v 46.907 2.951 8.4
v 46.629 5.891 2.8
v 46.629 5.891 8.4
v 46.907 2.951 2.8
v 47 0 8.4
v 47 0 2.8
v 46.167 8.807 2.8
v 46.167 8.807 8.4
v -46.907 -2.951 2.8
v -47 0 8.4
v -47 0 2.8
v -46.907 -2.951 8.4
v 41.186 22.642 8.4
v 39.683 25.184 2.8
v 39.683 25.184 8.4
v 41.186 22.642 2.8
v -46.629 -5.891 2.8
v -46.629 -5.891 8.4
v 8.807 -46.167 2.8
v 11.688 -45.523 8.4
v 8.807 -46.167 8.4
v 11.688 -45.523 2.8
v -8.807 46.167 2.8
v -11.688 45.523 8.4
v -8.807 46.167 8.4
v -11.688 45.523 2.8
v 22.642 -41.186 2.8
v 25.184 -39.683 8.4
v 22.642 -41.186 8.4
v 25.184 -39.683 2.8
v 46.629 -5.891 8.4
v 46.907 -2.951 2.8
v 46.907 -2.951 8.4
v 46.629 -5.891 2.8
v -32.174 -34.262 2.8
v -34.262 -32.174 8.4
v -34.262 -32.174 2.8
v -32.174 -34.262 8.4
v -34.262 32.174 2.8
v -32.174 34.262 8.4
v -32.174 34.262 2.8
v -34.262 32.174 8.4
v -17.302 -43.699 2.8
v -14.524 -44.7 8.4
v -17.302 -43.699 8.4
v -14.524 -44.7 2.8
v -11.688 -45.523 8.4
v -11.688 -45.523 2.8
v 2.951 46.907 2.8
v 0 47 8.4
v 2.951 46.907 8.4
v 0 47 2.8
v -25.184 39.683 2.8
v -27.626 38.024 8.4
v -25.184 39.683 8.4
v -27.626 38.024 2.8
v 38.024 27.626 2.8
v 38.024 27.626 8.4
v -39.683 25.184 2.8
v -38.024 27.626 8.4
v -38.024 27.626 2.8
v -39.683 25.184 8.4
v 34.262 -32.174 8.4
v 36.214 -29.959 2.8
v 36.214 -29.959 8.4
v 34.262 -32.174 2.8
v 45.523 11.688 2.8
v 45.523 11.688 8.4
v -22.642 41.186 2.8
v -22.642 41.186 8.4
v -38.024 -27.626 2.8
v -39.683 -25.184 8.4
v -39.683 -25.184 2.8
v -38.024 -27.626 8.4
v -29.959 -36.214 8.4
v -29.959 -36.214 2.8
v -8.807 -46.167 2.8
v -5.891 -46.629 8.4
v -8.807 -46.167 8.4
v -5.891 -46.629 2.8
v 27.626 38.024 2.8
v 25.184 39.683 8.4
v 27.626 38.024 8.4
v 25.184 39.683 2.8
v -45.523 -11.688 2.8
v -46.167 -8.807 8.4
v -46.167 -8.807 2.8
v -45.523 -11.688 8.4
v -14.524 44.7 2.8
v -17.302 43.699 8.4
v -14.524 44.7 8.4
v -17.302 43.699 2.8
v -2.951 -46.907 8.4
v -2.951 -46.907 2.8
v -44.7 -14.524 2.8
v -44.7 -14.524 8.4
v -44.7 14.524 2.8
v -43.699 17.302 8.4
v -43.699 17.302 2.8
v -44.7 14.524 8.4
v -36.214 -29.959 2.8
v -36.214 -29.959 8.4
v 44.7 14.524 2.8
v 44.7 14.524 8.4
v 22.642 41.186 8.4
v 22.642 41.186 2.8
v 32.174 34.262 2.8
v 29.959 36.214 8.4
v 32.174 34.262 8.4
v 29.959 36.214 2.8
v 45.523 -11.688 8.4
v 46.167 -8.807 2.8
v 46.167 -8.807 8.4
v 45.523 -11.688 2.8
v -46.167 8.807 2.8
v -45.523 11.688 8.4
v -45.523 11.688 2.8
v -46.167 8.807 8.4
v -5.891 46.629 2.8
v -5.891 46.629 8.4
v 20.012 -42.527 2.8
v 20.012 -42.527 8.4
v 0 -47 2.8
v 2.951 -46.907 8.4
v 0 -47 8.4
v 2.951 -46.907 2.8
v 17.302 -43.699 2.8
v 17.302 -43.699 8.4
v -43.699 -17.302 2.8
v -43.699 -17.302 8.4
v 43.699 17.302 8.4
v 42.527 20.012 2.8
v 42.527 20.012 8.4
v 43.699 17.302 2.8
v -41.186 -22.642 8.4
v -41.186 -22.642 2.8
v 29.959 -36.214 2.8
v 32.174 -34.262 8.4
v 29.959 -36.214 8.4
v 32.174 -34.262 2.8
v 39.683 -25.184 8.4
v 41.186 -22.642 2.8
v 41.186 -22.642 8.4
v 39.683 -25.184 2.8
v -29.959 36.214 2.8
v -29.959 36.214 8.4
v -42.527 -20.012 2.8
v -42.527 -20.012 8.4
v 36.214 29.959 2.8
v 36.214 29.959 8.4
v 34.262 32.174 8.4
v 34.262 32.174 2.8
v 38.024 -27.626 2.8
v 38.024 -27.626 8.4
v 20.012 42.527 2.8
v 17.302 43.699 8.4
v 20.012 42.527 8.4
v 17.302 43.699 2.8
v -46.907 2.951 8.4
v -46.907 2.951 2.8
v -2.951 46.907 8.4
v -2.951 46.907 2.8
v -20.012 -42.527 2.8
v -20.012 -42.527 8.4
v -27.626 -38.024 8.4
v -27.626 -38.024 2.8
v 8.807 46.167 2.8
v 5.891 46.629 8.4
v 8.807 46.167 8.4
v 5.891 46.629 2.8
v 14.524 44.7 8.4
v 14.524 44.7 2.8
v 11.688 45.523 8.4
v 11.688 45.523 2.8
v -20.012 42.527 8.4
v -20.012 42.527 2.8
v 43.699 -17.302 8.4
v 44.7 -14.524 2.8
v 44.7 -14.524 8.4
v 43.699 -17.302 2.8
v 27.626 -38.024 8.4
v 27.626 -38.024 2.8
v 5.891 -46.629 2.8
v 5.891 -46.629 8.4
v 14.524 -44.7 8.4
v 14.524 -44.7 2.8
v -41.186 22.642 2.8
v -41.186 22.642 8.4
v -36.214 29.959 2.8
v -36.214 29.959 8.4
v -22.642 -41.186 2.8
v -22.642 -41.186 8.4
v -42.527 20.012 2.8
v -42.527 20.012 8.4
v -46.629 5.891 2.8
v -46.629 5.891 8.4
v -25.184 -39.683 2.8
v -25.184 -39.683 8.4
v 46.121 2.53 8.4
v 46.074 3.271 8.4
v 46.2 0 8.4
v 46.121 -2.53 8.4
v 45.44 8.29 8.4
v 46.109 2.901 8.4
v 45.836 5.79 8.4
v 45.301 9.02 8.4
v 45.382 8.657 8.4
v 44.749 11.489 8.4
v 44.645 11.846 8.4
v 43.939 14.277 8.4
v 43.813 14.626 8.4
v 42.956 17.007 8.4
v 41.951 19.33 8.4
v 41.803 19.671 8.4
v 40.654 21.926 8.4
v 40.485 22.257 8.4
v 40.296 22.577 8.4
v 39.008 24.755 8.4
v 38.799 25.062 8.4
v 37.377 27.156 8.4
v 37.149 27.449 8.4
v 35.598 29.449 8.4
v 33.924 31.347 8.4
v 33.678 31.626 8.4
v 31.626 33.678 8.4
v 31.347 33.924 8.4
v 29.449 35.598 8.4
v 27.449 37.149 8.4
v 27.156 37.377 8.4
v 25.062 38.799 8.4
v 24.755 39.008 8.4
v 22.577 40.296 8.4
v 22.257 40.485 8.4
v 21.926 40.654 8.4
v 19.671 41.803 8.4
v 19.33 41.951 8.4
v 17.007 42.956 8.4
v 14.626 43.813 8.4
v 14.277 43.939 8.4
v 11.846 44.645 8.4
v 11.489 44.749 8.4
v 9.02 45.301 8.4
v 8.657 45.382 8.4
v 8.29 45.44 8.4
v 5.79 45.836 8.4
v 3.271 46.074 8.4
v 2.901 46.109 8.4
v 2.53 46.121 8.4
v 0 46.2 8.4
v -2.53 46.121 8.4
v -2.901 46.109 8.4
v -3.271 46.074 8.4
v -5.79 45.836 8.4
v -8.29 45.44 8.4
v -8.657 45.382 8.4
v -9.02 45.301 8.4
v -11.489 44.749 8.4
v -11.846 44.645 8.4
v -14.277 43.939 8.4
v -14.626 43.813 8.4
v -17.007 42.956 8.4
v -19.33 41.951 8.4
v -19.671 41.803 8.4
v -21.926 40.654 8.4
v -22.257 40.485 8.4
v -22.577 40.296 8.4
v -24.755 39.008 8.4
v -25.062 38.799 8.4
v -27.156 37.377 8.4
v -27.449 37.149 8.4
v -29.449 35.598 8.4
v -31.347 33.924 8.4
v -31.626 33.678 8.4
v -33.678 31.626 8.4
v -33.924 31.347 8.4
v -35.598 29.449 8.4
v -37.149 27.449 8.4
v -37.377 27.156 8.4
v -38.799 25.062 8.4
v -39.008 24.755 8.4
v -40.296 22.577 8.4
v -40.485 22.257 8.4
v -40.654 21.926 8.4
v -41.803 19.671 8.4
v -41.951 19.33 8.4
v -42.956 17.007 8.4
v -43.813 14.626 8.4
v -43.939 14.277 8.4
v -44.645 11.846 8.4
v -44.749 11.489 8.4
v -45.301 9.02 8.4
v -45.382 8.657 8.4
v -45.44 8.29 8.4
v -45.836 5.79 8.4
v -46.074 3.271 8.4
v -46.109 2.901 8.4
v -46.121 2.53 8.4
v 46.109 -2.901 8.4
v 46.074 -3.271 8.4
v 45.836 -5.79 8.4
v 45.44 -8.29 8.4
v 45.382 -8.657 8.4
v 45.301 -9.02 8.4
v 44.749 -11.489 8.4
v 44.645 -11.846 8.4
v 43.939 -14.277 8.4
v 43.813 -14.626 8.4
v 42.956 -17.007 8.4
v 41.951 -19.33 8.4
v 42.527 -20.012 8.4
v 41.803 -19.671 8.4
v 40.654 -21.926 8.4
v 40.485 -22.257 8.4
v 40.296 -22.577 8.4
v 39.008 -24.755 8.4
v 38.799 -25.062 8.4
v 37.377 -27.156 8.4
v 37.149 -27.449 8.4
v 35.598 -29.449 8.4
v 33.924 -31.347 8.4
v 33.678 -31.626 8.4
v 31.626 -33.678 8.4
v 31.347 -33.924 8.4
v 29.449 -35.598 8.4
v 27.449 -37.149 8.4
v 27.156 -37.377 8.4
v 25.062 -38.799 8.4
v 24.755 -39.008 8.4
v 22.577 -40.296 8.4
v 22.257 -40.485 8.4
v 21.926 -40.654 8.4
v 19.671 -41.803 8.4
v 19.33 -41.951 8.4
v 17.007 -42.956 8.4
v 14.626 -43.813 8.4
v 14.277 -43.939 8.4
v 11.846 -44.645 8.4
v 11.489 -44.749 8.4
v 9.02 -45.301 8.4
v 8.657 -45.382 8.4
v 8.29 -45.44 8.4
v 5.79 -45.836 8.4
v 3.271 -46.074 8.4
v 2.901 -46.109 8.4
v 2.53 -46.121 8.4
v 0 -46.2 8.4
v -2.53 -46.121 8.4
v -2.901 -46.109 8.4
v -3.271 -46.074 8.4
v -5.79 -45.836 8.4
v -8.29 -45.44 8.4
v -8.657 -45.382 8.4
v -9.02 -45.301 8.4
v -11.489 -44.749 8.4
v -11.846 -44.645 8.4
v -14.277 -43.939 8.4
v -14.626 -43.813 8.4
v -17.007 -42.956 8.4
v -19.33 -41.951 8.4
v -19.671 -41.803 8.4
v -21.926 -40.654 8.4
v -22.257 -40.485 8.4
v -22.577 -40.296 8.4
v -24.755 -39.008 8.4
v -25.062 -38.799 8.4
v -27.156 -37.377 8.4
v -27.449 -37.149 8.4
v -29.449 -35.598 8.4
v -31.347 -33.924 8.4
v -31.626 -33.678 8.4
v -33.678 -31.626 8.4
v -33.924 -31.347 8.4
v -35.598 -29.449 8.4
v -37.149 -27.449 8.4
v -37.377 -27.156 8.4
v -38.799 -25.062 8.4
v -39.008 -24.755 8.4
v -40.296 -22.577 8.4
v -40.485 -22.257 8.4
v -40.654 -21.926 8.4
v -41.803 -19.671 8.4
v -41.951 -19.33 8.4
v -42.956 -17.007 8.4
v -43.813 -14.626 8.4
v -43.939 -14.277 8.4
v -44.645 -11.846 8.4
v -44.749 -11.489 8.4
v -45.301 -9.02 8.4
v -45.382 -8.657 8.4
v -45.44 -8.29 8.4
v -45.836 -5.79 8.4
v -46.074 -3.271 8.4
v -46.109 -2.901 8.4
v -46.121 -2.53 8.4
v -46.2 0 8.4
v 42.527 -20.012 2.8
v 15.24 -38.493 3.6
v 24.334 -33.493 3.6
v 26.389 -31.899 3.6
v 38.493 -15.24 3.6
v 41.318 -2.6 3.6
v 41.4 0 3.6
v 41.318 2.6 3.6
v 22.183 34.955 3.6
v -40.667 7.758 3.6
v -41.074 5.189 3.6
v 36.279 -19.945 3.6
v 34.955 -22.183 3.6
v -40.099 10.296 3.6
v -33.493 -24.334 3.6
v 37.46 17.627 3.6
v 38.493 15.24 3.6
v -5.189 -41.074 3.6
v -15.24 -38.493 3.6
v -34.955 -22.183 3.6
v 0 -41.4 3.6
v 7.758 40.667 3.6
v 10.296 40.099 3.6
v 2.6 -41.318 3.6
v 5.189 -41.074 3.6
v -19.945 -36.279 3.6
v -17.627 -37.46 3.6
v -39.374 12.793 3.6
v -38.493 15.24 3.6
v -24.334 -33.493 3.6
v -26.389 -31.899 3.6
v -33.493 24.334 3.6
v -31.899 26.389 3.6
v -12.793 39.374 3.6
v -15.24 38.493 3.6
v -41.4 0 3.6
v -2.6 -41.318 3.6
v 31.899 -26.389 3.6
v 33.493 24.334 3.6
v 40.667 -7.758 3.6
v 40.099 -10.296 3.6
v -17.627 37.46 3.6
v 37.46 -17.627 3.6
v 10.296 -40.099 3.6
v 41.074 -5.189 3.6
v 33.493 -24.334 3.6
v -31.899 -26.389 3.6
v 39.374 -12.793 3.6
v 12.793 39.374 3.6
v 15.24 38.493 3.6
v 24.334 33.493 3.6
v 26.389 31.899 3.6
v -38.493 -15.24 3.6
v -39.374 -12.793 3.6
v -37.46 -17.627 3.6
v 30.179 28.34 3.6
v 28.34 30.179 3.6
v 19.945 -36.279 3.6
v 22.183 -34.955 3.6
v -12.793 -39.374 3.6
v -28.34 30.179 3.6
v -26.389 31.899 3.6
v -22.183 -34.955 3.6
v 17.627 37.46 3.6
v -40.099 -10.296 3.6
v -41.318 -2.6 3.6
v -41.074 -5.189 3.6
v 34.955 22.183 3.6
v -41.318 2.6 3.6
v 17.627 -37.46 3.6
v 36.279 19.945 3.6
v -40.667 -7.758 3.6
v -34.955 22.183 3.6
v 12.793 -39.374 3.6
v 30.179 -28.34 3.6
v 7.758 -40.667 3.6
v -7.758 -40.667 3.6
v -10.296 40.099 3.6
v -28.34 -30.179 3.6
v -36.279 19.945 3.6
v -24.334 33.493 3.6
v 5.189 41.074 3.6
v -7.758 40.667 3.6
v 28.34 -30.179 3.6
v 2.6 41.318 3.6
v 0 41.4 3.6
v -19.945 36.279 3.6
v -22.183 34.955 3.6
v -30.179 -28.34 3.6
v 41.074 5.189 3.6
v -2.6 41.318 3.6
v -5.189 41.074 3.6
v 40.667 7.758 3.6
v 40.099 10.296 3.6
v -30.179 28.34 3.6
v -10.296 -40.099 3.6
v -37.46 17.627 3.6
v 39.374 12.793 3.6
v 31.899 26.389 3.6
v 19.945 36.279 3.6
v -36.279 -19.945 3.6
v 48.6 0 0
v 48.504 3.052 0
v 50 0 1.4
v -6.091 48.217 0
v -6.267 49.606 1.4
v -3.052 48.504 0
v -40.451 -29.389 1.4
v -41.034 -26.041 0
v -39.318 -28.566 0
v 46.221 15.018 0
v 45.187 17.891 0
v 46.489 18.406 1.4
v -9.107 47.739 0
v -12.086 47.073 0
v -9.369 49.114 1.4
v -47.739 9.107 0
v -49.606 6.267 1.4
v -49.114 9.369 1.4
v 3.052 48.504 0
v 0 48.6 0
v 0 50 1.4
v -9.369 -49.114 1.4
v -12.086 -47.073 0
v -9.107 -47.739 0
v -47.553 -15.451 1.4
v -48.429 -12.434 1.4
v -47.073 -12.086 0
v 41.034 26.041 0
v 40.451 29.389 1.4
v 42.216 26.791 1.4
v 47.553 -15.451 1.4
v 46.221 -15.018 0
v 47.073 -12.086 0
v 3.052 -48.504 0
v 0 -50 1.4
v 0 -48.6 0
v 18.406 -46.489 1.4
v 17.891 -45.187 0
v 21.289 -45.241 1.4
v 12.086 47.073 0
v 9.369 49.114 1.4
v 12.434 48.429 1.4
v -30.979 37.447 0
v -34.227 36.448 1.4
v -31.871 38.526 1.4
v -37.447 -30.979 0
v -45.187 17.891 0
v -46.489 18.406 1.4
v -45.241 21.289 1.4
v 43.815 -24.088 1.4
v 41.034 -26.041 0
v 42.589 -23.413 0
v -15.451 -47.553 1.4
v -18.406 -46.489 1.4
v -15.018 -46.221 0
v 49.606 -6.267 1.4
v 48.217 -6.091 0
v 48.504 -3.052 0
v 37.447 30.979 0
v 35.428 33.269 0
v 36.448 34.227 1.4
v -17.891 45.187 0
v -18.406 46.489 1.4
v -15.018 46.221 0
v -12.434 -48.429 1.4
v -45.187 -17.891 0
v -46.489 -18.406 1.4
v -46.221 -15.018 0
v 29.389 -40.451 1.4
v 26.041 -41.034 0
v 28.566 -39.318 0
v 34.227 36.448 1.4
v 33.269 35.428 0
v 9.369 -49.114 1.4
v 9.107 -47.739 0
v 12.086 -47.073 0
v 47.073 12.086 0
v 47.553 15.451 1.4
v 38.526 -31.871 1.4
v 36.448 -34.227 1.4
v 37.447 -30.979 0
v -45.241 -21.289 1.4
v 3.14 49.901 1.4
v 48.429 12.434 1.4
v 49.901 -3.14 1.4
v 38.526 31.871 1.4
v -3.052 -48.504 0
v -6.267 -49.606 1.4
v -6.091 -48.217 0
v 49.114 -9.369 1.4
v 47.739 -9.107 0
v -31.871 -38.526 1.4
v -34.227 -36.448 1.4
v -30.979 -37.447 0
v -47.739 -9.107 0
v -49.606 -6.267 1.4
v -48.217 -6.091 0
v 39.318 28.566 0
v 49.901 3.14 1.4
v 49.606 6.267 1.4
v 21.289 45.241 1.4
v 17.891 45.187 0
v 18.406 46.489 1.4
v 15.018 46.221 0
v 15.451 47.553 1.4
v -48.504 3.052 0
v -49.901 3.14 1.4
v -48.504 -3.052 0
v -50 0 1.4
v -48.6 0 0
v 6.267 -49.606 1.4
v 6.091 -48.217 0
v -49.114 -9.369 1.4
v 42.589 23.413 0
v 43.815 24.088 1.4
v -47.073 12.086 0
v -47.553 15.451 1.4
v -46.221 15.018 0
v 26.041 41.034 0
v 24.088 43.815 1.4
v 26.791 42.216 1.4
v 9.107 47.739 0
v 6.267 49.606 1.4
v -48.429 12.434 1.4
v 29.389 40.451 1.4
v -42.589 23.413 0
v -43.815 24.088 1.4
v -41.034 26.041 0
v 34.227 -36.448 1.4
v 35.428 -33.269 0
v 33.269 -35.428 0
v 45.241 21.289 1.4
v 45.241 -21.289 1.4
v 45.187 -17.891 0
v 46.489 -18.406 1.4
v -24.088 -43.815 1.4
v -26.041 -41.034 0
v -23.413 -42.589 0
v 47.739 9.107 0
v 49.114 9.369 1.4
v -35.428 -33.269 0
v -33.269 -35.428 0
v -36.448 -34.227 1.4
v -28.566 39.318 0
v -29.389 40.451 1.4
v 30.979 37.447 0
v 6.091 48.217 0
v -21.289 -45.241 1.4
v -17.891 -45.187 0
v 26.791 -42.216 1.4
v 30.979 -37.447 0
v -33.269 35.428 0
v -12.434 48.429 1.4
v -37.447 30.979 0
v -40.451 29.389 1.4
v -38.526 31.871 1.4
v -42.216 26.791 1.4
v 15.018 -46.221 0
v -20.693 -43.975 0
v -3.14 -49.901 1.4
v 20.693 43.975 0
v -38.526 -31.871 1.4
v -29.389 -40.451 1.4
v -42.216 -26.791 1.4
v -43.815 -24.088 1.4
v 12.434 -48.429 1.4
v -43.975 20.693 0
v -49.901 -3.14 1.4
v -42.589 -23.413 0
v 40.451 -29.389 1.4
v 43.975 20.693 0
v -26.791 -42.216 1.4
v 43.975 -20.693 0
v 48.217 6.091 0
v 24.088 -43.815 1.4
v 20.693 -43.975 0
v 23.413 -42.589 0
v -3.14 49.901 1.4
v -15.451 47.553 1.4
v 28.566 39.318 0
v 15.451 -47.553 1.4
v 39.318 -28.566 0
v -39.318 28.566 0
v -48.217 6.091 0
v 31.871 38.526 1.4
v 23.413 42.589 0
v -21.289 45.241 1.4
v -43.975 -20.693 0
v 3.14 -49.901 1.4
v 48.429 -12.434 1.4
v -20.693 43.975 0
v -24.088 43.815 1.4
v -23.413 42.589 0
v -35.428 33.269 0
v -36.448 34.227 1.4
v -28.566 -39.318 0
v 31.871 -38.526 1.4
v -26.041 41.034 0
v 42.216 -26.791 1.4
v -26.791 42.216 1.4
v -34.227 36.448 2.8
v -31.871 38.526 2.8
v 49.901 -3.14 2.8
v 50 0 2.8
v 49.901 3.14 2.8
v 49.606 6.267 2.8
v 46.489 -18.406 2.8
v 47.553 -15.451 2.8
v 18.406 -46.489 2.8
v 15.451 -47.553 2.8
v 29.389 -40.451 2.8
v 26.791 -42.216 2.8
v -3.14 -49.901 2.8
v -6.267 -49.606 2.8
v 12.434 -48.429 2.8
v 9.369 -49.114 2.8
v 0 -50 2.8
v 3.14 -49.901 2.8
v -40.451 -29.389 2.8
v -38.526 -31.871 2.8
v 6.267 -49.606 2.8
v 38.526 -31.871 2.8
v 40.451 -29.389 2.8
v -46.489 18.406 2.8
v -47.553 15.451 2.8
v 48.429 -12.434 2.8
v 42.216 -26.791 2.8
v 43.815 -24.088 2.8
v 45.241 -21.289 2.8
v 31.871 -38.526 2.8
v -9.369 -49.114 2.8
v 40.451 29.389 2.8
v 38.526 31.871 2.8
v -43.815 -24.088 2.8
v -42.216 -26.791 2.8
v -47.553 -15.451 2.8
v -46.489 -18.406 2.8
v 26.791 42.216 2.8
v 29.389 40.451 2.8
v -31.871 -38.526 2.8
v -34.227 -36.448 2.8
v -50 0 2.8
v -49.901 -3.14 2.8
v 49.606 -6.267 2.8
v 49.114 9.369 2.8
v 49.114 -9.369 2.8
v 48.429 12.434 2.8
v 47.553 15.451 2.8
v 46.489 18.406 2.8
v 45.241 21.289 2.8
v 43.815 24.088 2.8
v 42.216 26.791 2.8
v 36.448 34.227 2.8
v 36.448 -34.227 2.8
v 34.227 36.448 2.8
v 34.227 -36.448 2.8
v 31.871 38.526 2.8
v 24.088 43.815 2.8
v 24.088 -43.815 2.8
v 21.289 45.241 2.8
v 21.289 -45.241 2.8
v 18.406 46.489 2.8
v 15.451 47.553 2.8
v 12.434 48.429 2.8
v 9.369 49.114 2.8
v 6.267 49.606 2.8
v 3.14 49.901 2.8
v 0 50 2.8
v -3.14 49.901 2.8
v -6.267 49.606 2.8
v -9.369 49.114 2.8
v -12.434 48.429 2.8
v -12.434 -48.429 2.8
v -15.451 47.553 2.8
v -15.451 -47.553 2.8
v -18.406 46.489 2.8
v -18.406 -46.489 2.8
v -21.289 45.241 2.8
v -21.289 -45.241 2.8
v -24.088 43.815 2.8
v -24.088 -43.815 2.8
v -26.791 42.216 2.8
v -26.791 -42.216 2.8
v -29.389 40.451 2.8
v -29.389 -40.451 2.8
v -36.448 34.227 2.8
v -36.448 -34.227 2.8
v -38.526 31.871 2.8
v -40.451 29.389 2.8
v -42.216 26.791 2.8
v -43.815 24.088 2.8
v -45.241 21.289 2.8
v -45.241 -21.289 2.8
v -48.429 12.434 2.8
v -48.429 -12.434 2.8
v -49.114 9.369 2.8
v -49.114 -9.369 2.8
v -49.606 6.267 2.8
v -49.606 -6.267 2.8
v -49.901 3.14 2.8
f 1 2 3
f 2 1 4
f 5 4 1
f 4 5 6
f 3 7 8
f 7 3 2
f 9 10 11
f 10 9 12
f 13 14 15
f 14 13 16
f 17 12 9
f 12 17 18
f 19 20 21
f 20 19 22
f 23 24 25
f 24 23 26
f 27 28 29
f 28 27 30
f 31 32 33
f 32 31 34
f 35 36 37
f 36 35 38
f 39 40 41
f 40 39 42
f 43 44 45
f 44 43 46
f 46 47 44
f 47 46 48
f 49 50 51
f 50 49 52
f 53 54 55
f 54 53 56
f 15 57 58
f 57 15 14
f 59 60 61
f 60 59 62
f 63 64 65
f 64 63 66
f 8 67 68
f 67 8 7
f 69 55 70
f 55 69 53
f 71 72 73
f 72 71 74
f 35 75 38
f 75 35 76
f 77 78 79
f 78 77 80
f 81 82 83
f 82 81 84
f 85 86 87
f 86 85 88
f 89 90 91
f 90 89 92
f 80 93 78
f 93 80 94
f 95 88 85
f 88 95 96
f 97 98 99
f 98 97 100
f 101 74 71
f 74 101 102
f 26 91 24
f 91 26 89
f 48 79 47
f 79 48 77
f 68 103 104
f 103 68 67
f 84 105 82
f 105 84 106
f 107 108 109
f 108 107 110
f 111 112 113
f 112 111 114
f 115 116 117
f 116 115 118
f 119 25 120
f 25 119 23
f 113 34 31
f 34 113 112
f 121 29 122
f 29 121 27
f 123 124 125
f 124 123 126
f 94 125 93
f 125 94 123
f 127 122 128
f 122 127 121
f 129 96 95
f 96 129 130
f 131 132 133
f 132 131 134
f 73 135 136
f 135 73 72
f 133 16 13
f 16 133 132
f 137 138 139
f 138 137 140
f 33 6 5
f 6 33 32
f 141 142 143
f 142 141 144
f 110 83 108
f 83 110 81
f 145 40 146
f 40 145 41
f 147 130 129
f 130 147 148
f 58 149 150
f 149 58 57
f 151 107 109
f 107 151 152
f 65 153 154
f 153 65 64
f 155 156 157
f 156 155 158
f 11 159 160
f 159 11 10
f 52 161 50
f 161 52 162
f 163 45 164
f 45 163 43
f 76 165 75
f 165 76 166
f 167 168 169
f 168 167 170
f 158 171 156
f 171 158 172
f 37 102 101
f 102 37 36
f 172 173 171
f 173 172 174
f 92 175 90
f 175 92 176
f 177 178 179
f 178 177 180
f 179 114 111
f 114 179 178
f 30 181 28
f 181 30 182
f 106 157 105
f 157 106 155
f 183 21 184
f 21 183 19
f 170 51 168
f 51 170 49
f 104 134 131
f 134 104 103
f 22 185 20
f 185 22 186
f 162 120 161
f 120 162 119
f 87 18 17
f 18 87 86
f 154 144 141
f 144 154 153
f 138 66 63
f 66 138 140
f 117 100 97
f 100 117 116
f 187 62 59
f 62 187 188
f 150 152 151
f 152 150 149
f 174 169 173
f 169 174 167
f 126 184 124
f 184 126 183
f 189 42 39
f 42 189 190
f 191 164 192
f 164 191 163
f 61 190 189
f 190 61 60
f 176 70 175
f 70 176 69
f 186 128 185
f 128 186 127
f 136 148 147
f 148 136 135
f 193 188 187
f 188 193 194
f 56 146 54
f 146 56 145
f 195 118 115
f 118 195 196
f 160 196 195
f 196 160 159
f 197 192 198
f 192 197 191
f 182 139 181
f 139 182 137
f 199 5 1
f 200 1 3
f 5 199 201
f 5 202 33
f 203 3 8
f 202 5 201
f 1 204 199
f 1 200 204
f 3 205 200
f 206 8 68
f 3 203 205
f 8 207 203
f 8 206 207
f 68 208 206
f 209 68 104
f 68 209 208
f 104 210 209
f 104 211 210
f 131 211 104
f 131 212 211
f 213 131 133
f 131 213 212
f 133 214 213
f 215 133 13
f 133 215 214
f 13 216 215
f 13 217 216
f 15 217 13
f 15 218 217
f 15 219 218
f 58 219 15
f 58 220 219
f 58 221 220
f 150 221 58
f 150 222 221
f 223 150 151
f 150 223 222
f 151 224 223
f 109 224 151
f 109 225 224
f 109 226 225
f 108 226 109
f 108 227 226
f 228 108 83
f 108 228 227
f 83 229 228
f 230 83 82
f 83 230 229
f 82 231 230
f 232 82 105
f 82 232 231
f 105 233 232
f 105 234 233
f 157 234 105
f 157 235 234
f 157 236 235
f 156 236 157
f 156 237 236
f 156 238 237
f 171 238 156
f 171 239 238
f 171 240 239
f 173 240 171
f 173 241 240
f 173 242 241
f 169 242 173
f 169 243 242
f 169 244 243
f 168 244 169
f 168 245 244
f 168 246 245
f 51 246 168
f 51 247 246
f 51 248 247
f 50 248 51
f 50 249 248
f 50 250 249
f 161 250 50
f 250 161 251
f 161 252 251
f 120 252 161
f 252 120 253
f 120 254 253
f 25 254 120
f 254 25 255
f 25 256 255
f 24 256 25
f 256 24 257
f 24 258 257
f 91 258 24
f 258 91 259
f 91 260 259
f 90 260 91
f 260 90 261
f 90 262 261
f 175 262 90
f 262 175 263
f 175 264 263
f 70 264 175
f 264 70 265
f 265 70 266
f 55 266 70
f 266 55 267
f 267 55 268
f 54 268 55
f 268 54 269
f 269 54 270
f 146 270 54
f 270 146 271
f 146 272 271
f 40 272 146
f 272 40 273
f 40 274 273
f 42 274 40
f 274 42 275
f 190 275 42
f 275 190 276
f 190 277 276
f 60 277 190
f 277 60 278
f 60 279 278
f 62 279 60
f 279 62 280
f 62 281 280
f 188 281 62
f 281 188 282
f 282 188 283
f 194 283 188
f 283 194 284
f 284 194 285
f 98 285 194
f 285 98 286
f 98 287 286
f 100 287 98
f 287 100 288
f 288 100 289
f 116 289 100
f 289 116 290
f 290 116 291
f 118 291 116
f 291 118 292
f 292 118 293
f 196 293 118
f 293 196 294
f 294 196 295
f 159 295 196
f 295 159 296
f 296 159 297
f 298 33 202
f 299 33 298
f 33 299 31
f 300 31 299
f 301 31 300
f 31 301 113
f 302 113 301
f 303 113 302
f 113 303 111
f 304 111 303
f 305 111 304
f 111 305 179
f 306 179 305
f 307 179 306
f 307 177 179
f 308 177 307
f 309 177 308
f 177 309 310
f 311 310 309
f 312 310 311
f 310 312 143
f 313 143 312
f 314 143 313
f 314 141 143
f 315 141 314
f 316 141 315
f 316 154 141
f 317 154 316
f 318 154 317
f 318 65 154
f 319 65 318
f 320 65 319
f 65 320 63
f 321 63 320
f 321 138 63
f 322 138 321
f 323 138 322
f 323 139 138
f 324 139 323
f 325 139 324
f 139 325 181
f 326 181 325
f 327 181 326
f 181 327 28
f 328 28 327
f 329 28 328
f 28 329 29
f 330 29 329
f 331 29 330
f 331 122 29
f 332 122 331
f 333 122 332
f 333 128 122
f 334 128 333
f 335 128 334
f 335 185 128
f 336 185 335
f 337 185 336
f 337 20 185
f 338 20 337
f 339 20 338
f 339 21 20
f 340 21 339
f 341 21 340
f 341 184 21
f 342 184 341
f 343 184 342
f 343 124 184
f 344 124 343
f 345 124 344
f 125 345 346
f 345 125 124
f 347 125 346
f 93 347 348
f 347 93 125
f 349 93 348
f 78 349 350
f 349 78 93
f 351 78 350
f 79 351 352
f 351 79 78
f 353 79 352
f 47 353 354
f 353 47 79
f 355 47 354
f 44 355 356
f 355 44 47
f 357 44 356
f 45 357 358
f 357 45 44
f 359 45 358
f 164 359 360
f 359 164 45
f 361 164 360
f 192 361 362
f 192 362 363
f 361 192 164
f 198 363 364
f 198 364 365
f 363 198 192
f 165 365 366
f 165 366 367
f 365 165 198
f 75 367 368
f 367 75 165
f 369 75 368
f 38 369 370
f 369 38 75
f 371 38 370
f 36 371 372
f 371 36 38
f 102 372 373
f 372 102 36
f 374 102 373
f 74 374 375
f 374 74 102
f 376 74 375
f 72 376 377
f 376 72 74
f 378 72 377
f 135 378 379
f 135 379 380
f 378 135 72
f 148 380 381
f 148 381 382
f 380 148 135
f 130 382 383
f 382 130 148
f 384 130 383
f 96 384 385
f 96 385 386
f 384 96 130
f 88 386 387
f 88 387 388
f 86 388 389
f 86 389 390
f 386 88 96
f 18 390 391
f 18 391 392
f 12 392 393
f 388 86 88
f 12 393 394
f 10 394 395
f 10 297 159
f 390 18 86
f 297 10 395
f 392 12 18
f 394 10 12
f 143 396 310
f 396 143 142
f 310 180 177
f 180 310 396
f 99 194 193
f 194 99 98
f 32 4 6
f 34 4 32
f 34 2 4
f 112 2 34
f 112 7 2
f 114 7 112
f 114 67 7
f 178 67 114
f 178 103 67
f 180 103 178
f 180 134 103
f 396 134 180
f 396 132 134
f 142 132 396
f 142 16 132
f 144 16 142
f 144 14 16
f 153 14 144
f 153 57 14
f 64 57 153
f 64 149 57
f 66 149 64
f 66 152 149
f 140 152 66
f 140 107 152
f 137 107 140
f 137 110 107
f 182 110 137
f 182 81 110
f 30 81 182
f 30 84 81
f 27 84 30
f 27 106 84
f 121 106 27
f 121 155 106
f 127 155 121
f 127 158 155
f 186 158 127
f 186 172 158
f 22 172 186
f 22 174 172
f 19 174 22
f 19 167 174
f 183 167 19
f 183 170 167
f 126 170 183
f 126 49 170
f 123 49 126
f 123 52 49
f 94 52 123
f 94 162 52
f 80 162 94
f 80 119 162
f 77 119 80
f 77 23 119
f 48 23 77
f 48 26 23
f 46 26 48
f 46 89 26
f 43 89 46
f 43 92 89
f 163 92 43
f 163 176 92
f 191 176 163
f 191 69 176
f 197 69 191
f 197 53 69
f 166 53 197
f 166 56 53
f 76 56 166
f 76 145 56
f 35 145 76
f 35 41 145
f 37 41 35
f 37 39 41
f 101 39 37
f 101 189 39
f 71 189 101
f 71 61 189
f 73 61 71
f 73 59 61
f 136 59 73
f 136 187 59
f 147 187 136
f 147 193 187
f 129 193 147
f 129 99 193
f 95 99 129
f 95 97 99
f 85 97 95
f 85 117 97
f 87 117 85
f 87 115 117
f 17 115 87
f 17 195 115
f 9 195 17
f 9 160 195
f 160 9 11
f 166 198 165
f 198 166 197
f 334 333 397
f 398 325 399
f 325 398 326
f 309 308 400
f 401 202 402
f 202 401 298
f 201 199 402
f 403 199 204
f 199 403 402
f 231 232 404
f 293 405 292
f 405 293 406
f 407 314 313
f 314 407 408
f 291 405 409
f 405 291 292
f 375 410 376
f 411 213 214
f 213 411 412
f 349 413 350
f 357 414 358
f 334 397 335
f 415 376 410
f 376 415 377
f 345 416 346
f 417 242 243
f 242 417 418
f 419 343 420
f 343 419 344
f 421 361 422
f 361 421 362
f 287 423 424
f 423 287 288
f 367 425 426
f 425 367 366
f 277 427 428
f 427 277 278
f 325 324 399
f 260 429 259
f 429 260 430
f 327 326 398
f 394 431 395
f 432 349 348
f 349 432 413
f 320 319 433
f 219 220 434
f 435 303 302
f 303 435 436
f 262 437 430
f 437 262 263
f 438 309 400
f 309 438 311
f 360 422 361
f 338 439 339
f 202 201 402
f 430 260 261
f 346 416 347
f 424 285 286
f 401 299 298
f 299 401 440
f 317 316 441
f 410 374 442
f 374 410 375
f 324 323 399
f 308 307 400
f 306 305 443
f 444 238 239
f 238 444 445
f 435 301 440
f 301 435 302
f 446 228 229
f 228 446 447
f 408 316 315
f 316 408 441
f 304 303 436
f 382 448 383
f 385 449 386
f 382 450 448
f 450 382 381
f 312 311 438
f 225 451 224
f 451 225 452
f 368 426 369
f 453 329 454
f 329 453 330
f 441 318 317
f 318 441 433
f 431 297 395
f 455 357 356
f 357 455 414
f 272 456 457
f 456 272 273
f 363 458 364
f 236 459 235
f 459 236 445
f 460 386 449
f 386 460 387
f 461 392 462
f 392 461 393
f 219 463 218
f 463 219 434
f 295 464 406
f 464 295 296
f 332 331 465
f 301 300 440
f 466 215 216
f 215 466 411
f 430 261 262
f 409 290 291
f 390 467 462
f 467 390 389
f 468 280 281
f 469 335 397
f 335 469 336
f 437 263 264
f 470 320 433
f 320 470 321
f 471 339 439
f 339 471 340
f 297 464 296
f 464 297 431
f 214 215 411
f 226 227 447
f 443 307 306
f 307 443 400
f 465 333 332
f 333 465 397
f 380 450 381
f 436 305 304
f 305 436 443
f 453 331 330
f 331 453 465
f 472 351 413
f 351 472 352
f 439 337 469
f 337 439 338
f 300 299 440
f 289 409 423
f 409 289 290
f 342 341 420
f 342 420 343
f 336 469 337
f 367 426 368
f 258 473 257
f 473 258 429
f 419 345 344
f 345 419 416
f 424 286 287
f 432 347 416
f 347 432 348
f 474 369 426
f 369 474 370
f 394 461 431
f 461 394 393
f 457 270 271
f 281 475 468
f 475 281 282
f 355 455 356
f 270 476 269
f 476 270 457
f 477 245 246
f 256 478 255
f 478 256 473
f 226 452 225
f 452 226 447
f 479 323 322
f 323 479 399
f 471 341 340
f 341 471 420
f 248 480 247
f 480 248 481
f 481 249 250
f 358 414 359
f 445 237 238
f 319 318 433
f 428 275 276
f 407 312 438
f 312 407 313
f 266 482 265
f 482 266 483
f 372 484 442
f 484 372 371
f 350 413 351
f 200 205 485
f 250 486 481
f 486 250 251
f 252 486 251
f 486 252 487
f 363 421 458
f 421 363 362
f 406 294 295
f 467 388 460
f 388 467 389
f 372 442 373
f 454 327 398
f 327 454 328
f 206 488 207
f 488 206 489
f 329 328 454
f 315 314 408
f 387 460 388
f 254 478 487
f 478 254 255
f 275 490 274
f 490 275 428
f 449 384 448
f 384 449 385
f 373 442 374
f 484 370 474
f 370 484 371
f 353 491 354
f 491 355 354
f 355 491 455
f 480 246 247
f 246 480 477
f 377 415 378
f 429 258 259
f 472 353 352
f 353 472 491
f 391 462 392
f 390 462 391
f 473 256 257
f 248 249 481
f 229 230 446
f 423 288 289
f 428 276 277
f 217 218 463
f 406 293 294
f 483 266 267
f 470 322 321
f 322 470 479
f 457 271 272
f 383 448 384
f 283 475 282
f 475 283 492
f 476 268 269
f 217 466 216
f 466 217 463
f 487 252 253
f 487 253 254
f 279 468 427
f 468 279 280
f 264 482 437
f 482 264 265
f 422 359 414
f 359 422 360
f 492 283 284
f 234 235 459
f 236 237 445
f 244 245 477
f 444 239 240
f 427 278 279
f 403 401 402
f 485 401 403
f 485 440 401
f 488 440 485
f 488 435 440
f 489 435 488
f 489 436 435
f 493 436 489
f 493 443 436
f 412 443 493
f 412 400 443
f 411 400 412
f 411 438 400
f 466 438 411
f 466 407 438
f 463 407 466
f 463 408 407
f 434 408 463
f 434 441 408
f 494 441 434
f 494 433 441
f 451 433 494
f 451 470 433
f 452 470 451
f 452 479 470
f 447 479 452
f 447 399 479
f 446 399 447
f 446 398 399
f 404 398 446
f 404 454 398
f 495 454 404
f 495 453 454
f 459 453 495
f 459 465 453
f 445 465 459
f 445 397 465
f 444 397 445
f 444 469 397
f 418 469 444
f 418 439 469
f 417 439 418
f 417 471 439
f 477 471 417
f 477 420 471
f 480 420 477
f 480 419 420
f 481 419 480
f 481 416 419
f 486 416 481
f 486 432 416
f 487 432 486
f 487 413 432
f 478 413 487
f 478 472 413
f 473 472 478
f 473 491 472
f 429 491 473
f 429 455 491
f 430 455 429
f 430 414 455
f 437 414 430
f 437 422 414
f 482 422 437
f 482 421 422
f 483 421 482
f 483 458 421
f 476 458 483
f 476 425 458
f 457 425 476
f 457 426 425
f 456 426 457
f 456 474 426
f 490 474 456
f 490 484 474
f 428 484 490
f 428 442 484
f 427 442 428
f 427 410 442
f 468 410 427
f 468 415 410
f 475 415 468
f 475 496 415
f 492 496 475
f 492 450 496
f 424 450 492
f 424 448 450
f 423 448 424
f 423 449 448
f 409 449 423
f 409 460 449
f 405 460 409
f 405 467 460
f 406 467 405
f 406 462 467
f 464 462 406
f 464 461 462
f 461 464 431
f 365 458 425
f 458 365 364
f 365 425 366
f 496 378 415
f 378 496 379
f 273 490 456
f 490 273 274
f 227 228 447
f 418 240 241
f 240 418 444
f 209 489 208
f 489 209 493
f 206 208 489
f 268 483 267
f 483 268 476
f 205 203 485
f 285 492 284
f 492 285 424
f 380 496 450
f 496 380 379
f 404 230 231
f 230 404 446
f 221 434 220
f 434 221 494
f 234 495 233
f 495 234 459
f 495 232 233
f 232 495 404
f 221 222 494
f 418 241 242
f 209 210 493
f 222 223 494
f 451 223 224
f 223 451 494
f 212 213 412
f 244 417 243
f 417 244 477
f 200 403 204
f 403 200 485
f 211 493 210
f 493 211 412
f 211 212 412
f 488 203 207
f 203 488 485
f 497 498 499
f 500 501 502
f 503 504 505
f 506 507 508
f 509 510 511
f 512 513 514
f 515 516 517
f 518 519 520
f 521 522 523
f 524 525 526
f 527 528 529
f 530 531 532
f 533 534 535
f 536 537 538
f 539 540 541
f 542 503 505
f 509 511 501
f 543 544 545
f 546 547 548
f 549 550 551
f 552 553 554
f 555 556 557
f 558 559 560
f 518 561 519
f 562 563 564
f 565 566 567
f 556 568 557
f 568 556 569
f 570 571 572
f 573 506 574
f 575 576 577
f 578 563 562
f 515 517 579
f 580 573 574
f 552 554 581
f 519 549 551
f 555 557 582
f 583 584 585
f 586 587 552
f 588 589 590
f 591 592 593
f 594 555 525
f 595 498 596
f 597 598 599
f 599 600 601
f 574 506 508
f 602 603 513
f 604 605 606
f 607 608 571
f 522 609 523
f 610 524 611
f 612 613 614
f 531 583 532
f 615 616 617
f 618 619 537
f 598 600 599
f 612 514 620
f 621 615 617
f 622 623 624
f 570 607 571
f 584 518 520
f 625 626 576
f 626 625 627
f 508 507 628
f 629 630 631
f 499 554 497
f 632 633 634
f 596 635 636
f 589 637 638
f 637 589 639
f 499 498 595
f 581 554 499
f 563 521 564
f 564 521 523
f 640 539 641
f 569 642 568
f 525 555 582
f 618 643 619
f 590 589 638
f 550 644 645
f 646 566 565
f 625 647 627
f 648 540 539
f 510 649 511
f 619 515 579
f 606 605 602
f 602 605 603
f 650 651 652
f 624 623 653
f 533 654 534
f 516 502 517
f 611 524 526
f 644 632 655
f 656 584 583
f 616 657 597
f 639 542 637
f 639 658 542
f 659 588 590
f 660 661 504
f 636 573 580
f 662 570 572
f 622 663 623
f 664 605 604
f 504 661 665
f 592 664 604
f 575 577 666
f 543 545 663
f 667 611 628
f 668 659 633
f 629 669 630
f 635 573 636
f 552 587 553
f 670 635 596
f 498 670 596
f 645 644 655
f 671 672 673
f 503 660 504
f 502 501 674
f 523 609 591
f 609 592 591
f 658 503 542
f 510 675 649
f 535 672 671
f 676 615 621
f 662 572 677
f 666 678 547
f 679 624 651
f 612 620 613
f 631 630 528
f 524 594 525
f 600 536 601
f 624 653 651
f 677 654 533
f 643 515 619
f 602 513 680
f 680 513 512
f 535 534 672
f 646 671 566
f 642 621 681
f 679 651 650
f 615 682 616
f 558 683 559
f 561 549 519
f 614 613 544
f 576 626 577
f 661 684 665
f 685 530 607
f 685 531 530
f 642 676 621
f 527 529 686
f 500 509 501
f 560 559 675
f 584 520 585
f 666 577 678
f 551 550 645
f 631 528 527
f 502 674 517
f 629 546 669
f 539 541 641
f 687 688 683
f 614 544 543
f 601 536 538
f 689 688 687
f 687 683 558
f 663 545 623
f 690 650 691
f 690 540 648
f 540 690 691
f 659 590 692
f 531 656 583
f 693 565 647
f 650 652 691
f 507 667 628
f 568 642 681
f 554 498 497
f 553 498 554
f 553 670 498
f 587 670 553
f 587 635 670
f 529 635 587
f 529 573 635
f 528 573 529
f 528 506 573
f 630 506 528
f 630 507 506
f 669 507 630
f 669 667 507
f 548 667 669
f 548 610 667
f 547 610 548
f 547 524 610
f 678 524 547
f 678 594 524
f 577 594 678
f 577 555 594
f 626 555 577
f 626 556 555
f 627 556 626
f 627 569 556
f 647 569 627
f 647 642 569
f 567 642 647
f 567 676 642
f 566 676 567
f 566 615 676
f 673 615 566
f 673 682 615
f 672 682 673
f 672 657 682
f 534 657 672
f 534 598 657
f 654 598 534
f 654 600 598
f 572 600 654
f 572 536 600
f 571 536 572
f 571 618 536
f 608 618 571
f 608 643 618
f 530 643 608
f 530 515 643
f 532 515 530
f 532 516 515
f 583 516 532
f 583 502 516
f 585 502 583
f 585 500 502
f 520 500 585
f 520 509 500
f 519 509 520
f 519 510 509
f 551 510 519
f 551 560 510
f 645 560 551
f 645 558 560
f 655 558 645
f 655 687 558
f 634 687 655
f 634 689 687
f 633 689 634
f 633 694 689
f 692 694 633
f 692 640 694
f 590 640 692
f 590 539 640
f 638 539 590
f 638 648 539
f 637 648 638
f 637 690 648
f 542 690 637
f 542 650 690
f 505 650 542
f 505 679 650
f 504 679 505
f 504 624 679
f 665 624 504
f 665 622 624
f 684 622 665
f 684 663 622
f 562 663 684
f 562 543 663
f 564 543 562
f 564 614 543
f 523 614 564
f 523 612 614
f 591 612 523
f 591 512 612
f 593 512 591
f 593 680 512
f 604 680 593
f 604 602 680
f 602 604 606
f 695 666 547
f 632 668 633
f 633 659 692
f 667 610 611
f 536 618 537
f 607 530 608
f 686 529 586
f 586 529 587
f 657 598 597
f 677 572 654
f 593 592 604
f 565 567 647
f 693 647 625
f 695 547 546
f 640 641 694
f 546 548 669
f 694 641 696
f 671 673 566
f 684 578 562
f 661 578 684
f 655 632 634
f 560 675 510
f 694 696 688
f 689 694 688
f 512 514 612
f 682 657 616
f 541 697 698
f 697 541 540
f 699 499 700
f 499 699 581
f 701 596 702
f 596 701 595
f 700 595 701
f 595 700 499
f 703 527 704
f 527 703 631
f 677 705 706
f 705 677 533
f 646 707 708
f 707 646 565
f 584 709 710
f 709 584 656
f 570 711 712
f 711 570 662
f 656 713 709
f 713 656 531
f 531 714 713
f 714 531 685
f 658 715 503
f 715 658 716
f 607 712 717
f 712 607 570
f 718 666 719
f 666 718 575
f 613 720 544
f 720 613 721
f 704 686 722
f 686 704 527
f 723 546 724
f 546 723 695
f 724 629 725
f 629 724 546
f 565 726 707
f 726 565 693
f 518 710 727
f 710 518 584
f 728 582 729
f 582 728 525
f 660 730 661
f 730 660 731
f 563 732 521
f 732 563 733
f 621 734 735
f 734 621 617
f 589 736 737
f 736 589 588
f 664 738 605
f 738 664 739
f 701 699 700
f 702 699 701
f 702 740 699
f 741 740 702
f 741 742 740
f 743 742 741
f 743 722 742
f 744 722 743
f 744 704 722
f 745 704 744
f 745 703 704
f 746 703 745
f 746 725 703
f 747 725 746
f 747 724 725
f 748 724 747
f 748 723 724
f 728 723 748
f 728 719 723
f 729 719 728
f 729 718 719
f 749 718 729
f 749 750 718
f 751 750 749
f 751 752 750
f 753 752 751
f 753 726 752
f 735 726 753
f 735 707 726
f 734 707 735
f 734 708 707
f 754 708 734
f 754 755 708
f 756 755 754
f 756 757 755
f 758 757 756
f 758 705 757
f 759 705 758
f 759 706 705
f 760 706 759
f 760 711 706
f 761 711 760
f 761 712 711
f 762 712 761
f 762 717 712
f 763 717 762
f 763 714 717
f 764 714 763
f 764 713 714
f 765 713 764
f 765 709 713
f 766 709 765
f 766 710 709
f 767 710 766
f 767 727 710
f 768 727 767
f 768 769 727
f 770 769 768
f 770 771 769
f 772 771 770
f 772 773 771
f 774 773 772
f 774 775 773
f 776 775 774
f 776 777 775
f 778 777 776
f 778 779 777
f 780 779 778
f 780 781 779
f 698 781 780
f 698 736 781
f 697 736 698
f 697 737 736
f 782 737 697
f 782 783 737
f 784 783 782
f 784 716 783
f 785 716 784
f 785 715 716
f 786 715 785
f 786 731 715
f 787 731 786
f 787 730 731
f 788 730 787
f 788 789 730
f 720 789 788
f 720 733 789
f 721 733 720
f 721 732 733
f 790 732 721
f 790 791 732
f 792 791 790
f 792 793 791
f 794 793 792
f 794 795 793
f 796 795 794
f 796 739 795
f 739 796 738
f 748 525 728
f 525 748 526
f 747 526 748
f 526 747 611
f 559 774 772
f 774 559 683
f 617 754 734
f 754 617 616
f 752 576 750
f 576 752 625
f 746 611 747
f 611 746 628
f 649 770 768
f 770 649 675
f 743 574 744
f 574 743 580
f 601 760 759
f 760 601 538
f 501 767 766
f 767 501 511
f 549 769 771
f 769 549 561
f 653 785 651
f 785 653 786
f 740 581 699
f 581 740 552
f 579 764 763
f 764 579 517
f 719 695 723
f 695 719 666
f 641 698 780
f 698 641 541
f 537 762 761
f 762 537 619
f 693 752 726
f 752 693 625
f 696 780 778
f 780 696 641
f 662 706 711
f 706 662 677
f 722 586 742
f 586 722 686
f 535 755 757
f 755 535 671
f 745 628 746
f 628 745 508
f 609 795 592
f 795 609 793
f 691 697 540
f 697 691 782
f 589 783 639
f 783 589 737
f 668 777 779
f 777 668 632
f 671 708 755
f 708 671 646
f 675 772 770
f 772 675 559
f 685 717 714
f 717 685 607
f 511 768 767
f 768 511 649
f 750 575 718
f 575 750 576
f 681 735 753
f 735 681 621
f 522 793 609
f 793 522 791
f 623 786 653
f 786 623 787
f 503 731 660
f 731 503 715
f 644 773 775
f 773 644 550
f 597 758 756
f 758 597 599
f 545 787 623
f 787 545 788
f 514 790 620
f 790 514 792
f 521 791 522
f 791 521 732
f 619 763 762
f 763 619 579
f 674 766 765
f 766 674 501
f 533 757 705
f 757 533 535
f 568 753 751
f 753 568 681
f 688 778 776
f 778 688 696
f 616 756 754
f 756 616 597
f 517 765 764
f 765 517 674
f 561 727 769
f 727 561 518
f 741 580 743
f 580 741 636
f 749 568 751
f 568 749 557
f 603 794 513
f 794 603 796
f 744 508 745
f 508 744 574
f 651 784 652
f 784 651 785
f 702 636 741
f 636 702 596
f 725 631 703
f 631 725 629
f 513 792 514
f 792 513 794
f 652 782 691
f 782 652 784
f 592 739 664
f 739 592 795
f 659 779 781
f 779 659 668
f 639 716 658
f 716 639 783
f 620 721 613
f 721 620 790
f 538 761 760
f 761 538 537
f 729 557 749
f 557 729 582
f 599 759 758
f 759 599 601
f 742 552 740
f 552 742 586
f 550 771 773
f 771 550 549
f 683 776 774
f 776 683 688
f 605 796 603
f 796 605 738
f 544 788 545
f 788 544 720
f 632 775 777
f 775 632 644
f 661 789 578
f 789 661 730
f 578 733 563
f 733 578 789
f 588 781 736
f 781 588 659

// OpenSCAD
/*
pipe_locks_generator.scad

This OpenSCAD script generates customizable locking mechanisms for
pipes and tubes of various sizes. It includes three main components:

- Fixed base lock
- Threaded collar
- Threaded lid

These parts are designed to seal tubular structures, making them
ideal for creating recipients or containers.
*/


/* [Part selector] */
part_options = "Base"; // [Base, Collar, Lid]

/* [Main dimensions] */
outer_diameter = 100.0;
thickness = 2.8;
clearance = 0.2;
thread_heigth = 10;

/* [Curled pattern options] */
curled_pattern = "String"; // [Strong, Medium, Light, None]

/* [Printer settings] */
//layer_height = 0.20; // [0.05, 0.010, 0.15, 0.20, 0.25, 0.30, 0.35, 0.40]
nozzle_width = 0.40; // [0.20, 0.40, 0.50, 0.60, 0.80]
printer_tolerance = 0.2; // [0.05,0.010,0.15,0.20,0.25,0.30,0.35,0.40]

/* [Hidden] */
inner_diameter = outer_diameter-2*thickness-clearance-printer_tolerance;


// Default redering resolution
$fa = $preview ? 5.0 : 2.0; // default minimum facet angle
$fs = $preview ? 2.0 : 1.0; // default minimum facet size
$fn = $preview ? 50.0 : 100.0; // default number of fragments

// Functions
function thread_diameter(is_external) = is_external ? 
  (inner_diameter-2*thickness) : 
  (inner_diameter-2*thickness-2*(printer_tolerance+clearance));

function chamfer_positon(is_external) = is_external ?
  -2*nozzle_width :
  -2*nozzle_width-sqrt(2)*thickness;

function curl_option(option) = (option == "Strong") ?
  1/2 : (option == "Medium") ?
  1/3 : (option == "Light") ?
  1/4 : 0;

// Permanent Bottom Lock
module fixed_base_lock() {
  union() {
    cylinder(h = thickness/2,
             d2 = outer_diameter,
             d1 = outer_diameter - thickness);
    translate([0, 0, thickness/2]) cylinder(h = thickness/2,
                                            d = outer_diameter);
    translate([0, 0, thickness]) {
      difference() {
        cylinder(h = 2*thickness,
                 d = inner_diameter);
        translate([0, 0, 2*nozzle_width]) {
          cylinder(h = 2*(thickness),
                   d2 = inner_diameter,
                   d1 = inner_diameter-4*thickness);
        }
      }
    }
  }
}

// Threaded Locking Mechanism
module threaded_collar() {
  difference() {
    union() {
      cylinder(h = thread_heigth,
               d = inner_diameter);
      translate([0, 0, thread_heigth-thickness/2])
      cylinder(h = thickness/2,
               d = outer_diameter);
    }
    thread(true);
  }
}

module locking_lid() {
  difference() {
    thread(false);
  }
  difference() {
    union() {
      translate([0, 0, thread_heigth]) {
        cylinder(h = thread_heigth-thickness,
                 d = outer_diameter);
        translate([0, 0, thread_heigth-thickness]) {
          cylinder(h = thickness/2,
                   d1 = outer_diameter,
                   d2 = outer_diameter-thickness);
        }
      }
    }
    curl();
  }
}

// Thread
module thread(is_external = true) {

  module thread_chamfer(is_external) {
    translate([0, 0, chamfer_positon(is_external)]) {
      rotate_extrude() {
        polygon([[0, 0], [inner_diameter/2, 0], [0, inner_diameter/2]]);
      }
    }
  }
  
  difference() {
    union() {
      linear_extrude(height = thread_heigth+0.01, // 0.01 diff. preview fix
                     convexity = 5,
                     twist = -720) {
        translate([thickness/4, 0, 0]) {
          circle(d = thread_diameter(is_external));
        }
      }
      if (is_external) {
        thread_chamfer(true);
      }
    }
    if (!is_external) {
      thread_chamfer(false);
    }
  }
}

// Curled pattern
module curl(diameter = outer_diameter,
            deepness = curl_option(curled_pattern)*thickness,
            divisor = 72) {
  translate([0, 0, thread_heigth]) {
    for (i = [-1:2:1]) {
      linear_extrude(height = thread_heigth,
                     convexity = 5,
                     twist = i*10) {
        for (i = [0: 360/divisor:360-360/divisor]) {
          rotate([0, 0, i]) {
            translate([-outer_diameter/2, 0, 0]) {
              circle(r = deepness, $fn = 3);
            }
          }
        }
      }
    }
  }
}

// Main (customizer part options)
// Re-orient parts for 3D pinting when needed
if (part_options == "Base") {
    fixed_base_lock();
} else if (part_options == "Collar") {
  translate([0, 0, thread_heigth]) {
    rotate([180, 0, 0]) {
      threaded_collar();
    }
  }
} else if (part_options == "Lid") {
  translate([0, 0, 2*thread_heigth-thickness/2])
  rotate([180, 0, 0]) {
    locking_lid();
  }
}
